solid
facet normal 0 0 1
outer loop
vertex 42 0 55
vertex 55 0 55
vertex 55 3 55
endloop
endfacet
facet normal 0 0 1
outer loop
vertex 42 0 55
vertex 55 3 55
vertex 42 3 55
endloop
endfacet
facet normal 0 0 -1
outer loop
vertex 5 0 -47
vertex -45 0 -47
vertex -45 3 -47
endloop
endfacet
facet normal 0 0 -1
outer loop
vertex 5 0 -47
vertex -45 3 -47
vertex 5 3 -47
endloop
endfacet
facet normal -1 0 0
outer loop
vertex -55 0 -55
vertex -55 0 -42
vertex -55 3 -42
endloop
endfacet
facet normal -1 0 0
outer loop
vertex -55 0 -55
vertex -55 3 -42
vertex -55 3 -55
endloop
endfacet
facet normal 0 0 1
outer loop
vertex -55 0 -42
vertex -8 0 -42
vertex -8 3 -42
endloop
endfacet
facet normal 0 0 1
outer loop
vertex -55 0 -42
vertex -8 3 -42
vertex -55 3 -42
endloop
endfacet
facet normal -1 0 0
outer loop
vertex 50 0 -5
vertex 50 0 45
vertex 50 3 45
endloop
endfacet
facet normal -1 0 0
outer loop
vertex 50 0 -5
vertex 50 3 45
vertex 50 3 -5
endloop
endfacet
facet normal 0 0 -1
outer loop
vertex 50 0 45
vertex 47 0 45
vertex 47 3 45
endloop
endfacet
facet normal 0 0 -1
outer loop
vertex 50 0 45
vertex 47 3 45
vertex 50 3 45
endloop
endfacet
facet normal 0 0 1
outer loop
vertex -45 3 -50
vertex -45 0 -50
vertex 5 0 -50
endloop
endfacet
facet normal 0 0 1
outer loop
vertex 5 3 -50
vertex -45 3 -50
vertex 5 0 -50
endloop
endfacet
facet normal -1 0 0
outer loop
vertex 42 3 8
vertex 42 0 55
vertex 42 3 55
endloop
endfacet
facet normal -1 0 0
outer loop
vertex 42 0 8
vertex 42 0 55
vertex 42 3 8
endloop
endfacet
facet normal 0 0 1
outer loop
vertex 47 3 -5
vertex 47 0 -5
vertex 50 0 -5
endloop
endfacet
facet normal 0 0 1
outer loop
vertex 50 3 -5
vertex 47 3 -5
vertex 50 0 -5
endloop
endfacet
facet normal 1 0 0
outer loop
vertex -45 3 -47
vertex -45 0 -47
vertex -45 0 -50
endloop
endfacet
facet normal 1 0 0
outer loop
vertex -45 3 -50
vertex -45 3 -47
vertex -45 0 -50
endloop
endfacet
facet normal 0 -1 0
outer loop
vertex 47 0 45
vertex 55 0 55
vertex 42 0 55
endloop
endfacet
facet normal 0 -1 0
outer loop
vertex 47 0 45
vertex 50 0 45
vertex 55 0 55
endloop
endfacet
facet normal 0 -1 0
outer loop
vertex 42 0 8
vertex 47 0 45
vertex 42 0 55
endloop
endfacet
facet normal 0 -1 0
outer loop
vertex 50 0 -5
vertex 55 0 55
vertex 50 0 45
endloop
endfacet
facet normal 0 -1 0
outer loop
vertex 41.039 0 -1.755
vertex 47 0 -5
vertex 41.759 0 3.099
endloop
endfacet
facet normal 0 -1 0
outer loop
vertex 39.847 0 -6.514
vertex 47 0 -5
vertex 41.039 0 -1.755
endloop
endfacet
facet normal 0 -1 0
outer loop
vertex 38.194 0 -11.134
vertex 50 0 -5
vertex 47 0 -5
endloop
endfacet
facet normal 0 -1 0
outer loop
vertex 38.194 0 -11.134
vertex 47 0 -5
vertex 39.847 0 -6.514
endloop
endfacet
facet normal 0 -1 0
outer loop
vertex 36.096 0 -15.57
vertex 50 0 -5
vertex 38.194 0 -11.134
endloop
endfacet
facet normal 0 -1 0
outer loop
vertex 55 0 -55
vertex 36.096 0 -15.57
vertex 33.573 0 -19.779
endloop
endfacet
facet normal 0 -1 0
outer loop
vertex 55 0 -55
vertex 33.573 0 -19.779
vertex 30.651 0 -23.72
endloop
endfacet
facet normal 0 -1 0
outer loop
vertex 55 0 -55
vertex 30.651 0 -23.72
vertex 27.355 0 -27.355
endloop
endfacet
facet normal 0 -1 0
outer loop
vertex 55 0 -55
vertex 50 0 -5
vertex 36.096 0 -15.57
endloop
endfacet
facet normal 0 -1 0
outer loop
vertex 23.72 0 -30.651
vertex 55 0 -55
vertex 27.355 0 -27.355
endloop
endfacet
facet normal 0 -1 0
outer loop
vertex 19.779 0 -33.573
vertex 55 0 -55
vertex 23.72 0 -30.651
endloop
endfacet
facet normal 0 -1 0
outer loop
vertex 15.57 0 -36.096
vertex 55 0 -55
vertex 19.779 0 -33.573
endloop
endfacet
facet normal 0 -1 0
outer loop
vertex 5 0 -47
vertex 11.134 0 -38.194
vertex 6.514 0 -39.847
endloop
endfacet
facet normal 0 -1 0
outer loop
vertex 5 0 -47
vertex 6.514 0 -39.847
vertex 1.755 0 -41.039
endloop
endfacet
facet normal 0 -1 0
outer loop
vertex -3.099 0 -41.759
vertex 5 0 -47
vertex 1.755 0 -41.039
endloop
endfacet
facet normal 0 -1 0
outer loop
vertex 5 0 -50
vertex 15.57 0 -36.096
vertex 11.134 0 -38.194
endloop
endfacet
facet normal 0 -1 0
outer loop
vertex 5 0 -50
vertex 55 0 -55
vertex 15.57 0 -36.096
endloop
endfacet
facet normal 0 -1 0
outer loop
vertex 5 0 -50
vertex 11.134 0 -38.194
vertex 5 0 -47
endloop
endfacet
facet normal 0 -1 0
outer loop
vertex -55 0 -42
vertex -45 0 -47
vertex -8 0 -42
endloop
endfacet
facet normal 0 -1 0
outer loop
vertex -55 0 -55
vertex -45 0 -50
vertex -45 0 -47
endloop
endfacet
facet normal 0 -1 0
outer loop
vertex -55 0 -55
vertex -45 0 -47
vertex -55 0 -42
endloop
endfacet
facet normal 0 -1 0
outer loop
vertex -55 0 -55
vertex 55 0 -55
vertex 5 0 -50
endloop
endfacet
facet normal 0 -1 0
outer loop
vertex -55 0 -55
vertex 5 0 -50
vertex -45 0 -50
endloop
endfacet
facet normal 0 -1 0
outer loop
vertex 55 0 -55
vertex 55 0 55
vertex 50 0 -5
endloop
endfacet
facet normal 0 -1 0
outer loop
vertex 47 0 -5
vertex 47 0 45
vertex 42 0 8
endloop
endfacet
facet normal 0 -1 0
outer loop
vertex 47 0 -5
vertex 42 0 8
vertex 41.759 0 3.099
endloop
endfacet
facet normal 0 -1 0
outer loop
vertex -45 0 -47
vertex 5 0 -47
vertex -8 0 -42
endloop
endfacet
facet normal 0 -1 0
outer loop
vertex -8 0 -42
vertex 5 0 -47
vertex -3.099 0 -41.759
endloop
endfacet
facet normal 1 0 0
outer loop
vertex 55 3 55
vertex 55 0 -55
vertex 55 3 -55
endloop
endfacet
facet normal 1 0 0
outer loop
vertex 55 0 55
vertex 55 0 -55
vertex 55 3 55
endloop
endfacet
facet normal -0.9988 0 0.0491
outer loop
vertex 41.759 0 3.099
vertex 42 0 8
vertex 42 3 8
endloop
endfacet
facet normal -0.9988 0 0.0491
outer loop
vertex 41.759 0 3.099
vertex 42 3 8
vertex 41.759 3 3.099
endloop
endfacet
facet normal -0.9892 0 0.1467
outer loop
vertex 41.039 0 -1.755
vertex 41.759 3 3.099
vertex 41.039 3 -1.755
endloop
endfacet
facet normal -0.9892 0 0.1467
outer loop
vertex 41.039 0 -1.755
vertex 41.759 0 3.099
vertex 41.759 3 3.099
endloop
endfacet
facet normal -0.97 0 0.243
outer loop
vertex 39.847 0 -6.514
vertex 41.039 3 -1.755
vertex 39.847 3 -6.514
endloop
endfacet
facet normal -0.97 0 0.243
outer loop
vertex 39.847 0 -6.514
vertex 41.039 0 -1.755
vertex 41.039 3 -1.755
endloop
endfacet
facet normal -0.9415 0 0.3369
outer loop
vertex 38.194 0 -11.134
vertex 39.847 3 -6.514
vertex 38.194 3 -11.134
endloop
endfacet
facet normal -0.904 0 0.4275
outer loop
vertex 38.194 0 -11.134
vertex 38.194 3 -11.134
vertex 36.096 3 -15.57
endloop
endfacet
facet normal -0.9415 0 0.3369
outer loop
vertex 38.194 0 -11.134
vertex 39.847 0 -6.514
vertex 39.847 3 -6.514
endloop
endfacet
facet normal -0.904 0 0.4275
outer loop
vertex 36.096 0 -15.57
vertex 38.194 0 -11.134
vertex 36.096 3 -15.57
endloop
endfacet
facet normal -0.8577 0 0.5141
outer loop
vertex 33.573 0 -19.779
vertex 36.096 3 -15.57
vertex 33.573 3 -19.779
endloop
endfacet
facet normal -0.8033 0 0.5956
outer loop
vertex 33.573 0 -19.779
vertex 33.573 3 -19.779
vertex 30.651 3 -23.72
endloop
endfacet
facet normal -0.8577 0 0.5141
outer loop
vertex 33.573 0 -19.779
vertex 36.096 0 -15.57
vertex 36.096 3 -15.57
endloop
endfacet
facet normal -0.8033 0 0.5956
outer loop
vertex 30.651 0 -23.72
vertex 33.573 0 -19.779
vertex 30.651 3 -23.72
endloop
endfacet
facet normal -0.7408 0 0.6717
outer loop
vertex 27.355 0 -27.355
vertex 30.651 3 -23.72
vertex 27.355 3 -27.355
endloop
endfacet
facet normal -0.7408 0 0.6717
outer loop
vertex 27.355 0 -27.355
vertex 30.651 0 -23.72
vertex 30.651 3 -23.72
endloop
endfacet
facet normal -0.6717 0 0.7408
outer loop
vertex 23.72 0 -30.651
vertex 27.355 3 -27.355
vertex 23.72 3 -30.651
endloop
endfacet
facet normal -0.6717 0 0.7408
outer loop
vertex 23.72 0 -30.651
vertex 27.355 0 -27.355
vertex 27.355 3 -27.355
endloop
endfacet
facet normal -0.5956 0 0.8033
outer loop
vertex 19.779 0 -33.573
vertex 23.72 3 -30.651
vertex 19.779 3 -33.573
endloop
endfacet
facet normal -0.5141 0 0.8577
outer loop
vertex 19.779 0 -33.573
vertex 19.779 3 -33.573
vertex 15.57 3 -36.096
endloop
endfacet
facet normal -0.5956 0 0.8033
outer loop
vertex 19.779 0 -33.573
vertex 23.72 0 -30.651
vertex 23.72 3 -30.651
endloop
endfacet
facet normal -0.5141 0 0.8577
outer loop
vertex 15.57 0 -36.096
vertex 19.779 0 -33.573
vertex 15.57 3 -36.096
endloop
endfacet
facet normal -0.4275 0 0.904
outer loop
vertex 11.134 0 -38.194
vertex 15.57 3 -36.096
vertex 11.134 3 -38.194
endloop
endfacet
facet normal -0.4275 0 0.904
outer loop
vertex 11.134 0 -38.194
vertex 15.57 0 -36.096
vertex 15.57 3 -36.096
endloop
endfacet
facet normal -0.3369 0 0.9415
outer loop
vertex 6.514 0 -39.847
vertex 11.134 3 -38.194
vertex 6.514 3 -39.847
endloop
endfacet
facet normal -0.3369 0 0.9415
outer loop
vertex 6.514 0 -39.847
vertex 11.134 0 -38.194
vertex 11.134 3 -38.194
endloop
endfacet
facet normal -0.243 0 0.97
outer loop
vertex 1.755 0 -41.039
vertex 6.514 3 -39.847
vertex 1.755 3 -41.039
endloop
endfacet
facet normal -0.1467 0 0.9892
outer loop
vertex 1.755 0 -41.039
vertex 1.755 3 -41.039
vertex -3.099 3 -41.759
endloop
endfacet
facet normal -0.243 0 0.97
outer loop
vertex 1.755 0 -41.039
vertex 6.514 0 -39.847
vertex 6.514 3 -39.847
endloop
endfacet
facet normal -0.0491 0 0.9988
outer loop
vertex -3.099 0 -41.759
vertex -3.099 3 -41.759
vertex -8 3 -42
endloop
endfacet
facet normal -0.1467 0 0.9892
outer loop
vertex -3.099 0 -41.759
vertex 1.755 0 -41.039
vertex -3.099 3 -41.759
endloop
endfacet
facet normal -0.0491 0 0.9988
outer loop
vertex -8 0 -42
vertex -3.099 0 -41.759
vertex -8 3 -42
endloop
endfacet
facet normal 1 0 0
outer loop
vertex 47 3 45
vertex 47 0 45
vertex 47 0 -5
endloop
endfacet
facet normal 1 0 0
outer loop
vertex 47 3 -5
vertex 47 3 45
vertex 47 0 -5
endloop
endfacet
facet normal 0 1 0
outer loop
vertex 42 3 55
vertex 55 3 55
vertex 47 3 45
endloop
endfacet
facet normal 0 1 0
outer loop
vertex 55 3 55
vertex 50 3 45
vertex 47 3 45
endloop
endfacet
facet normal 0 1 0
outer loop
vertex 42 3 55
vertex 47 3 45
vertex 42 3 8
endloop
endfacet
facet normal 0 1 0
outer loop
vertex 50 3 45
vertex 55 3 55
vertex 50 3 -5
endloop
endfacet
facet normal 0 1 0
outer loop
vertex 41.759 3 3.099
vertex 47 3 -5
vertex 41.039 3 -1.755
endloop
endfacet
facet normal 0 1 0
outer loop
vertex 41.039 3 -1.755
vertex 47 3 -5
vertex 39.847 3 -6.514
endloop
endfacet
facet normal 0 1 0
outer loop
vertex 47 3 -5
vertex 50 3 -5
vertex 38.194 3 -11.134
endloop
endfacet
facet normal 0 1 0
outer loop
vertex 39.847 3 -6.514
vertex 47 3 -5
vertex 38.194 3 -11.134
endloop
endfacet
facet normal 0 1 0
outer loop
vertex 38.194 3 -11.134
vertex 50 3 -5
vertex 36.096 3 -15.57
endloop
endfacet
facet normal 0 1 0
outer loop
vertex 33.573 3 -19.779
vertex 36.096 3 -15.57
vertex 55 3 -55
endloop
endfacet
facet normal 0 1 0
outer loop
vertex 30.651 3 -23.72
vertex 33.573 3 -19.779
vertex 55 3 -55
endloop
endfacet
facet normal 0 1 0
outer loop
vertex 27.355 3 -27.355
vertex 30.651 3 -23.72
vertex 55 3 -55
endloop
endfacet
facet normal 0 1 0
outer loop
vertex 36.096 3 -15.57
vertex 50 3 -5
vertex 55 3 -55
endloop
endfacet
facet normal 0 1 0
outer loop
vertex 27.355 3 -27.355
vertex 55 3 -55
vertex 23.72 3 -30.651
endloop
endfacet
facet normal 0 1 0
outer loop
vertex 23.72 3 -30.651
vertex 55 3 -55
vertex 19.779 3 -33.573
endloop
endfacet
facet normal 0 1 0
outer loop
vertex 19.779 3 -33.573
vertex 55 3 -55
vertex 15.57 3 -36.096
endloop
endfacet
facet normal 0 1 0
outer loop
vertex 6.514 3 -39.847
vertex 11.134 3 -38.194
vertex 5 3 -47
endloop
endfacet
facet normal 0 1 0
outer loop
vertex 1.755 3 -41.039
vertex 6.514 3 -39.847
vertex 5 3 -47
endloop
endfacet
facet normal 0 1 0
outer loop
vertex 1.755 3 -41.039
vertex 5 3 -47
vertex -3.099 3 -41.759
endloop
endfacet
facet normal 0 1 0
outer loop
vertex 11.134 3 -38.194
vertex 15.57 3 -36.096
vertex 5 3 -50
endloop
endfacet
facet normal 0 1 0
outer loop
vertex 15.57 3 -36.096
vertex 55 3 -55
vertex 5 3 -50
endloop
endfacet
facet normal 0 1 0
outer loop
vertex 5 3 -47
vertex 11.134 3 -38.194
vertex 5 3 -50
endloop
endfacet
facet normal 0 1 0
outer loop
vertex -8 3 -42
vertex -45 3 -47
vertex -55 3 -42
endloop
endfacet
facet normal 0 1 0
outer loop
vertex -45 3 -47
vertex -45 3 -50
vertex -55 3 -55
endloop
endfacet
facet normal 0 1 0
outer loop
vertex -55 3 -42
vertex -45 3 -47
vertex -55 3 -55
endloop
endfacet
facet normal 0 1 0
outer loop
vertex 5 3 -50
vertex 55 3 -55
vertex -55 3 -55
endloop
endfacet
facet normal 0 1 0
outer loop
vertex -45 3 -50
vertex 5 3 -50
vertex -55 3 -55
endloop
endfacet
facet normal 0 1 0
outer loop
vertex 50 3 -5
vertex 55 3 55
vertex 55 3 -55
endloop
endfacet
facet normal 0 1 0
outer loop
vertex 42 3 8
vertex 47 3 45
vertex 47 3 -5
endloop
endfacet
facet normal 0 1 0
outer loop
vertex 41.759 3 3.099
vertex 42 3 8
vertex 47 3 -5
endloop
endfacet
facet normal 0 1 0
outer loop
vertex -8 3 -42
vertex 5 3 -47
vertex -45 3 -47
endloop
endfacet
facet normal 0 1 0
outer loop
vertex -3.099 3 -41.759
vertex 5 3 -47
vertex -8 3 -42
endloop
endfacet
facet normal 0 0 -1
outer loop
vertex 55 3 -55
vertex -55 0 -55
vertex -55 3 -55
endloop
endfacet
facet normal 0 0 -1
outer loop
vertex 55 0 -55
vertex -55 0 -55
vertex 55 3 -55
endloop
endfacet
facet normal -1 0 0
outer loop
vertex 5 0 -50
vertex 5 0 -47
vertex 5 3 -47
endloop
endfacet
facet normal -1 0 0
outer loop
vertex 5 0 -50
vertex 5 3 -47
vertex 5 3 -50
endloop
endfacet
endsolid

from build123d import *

# Parameters (mm, degrees)
SKETCH1_W           = 50
SKETCH1_H           = 3
SKETCH1_W_2         = 3
SKETCH1_H_2         = 50
BOSS_EXTRUDE1_DEPTH = 3


with BuildPart() as part:
    # Sketch1 → Boss-Extrude1 (new body)
    with BuildSketch(Plane(origin=(0, 0, 0), x_dir=(1, 0, 0), z_dir=(0, 1, 0))):
        with BuildLine():
            Line((-55, 55), (55, 55))
            Line((55, 55), (55, -55))
            Line((55, -55), (42, -55))
            Line((42, -55), (42, -8))
            ThreePointArc((42, -8), (27.355339059, 27.355339059), (-8, 42))
            Line((-8, 42), (-55, 42))
            Line((-55, 42), (-55, 55))
        make_face()
        with Locations((-20, 48.5)):
            Rectangle(SKETCH1_W, SKETCH1_H, mode=Mode.SUBTRACT)
        with Locations((48.5, -20)):
            Rectangle(SKETCH1_W_2, SKETCH1_H_2, mode=Mode.SUBTRACT)
    extrude(amount=BOSS_EXTRUDE1_DEPTH)


solid = part.part
